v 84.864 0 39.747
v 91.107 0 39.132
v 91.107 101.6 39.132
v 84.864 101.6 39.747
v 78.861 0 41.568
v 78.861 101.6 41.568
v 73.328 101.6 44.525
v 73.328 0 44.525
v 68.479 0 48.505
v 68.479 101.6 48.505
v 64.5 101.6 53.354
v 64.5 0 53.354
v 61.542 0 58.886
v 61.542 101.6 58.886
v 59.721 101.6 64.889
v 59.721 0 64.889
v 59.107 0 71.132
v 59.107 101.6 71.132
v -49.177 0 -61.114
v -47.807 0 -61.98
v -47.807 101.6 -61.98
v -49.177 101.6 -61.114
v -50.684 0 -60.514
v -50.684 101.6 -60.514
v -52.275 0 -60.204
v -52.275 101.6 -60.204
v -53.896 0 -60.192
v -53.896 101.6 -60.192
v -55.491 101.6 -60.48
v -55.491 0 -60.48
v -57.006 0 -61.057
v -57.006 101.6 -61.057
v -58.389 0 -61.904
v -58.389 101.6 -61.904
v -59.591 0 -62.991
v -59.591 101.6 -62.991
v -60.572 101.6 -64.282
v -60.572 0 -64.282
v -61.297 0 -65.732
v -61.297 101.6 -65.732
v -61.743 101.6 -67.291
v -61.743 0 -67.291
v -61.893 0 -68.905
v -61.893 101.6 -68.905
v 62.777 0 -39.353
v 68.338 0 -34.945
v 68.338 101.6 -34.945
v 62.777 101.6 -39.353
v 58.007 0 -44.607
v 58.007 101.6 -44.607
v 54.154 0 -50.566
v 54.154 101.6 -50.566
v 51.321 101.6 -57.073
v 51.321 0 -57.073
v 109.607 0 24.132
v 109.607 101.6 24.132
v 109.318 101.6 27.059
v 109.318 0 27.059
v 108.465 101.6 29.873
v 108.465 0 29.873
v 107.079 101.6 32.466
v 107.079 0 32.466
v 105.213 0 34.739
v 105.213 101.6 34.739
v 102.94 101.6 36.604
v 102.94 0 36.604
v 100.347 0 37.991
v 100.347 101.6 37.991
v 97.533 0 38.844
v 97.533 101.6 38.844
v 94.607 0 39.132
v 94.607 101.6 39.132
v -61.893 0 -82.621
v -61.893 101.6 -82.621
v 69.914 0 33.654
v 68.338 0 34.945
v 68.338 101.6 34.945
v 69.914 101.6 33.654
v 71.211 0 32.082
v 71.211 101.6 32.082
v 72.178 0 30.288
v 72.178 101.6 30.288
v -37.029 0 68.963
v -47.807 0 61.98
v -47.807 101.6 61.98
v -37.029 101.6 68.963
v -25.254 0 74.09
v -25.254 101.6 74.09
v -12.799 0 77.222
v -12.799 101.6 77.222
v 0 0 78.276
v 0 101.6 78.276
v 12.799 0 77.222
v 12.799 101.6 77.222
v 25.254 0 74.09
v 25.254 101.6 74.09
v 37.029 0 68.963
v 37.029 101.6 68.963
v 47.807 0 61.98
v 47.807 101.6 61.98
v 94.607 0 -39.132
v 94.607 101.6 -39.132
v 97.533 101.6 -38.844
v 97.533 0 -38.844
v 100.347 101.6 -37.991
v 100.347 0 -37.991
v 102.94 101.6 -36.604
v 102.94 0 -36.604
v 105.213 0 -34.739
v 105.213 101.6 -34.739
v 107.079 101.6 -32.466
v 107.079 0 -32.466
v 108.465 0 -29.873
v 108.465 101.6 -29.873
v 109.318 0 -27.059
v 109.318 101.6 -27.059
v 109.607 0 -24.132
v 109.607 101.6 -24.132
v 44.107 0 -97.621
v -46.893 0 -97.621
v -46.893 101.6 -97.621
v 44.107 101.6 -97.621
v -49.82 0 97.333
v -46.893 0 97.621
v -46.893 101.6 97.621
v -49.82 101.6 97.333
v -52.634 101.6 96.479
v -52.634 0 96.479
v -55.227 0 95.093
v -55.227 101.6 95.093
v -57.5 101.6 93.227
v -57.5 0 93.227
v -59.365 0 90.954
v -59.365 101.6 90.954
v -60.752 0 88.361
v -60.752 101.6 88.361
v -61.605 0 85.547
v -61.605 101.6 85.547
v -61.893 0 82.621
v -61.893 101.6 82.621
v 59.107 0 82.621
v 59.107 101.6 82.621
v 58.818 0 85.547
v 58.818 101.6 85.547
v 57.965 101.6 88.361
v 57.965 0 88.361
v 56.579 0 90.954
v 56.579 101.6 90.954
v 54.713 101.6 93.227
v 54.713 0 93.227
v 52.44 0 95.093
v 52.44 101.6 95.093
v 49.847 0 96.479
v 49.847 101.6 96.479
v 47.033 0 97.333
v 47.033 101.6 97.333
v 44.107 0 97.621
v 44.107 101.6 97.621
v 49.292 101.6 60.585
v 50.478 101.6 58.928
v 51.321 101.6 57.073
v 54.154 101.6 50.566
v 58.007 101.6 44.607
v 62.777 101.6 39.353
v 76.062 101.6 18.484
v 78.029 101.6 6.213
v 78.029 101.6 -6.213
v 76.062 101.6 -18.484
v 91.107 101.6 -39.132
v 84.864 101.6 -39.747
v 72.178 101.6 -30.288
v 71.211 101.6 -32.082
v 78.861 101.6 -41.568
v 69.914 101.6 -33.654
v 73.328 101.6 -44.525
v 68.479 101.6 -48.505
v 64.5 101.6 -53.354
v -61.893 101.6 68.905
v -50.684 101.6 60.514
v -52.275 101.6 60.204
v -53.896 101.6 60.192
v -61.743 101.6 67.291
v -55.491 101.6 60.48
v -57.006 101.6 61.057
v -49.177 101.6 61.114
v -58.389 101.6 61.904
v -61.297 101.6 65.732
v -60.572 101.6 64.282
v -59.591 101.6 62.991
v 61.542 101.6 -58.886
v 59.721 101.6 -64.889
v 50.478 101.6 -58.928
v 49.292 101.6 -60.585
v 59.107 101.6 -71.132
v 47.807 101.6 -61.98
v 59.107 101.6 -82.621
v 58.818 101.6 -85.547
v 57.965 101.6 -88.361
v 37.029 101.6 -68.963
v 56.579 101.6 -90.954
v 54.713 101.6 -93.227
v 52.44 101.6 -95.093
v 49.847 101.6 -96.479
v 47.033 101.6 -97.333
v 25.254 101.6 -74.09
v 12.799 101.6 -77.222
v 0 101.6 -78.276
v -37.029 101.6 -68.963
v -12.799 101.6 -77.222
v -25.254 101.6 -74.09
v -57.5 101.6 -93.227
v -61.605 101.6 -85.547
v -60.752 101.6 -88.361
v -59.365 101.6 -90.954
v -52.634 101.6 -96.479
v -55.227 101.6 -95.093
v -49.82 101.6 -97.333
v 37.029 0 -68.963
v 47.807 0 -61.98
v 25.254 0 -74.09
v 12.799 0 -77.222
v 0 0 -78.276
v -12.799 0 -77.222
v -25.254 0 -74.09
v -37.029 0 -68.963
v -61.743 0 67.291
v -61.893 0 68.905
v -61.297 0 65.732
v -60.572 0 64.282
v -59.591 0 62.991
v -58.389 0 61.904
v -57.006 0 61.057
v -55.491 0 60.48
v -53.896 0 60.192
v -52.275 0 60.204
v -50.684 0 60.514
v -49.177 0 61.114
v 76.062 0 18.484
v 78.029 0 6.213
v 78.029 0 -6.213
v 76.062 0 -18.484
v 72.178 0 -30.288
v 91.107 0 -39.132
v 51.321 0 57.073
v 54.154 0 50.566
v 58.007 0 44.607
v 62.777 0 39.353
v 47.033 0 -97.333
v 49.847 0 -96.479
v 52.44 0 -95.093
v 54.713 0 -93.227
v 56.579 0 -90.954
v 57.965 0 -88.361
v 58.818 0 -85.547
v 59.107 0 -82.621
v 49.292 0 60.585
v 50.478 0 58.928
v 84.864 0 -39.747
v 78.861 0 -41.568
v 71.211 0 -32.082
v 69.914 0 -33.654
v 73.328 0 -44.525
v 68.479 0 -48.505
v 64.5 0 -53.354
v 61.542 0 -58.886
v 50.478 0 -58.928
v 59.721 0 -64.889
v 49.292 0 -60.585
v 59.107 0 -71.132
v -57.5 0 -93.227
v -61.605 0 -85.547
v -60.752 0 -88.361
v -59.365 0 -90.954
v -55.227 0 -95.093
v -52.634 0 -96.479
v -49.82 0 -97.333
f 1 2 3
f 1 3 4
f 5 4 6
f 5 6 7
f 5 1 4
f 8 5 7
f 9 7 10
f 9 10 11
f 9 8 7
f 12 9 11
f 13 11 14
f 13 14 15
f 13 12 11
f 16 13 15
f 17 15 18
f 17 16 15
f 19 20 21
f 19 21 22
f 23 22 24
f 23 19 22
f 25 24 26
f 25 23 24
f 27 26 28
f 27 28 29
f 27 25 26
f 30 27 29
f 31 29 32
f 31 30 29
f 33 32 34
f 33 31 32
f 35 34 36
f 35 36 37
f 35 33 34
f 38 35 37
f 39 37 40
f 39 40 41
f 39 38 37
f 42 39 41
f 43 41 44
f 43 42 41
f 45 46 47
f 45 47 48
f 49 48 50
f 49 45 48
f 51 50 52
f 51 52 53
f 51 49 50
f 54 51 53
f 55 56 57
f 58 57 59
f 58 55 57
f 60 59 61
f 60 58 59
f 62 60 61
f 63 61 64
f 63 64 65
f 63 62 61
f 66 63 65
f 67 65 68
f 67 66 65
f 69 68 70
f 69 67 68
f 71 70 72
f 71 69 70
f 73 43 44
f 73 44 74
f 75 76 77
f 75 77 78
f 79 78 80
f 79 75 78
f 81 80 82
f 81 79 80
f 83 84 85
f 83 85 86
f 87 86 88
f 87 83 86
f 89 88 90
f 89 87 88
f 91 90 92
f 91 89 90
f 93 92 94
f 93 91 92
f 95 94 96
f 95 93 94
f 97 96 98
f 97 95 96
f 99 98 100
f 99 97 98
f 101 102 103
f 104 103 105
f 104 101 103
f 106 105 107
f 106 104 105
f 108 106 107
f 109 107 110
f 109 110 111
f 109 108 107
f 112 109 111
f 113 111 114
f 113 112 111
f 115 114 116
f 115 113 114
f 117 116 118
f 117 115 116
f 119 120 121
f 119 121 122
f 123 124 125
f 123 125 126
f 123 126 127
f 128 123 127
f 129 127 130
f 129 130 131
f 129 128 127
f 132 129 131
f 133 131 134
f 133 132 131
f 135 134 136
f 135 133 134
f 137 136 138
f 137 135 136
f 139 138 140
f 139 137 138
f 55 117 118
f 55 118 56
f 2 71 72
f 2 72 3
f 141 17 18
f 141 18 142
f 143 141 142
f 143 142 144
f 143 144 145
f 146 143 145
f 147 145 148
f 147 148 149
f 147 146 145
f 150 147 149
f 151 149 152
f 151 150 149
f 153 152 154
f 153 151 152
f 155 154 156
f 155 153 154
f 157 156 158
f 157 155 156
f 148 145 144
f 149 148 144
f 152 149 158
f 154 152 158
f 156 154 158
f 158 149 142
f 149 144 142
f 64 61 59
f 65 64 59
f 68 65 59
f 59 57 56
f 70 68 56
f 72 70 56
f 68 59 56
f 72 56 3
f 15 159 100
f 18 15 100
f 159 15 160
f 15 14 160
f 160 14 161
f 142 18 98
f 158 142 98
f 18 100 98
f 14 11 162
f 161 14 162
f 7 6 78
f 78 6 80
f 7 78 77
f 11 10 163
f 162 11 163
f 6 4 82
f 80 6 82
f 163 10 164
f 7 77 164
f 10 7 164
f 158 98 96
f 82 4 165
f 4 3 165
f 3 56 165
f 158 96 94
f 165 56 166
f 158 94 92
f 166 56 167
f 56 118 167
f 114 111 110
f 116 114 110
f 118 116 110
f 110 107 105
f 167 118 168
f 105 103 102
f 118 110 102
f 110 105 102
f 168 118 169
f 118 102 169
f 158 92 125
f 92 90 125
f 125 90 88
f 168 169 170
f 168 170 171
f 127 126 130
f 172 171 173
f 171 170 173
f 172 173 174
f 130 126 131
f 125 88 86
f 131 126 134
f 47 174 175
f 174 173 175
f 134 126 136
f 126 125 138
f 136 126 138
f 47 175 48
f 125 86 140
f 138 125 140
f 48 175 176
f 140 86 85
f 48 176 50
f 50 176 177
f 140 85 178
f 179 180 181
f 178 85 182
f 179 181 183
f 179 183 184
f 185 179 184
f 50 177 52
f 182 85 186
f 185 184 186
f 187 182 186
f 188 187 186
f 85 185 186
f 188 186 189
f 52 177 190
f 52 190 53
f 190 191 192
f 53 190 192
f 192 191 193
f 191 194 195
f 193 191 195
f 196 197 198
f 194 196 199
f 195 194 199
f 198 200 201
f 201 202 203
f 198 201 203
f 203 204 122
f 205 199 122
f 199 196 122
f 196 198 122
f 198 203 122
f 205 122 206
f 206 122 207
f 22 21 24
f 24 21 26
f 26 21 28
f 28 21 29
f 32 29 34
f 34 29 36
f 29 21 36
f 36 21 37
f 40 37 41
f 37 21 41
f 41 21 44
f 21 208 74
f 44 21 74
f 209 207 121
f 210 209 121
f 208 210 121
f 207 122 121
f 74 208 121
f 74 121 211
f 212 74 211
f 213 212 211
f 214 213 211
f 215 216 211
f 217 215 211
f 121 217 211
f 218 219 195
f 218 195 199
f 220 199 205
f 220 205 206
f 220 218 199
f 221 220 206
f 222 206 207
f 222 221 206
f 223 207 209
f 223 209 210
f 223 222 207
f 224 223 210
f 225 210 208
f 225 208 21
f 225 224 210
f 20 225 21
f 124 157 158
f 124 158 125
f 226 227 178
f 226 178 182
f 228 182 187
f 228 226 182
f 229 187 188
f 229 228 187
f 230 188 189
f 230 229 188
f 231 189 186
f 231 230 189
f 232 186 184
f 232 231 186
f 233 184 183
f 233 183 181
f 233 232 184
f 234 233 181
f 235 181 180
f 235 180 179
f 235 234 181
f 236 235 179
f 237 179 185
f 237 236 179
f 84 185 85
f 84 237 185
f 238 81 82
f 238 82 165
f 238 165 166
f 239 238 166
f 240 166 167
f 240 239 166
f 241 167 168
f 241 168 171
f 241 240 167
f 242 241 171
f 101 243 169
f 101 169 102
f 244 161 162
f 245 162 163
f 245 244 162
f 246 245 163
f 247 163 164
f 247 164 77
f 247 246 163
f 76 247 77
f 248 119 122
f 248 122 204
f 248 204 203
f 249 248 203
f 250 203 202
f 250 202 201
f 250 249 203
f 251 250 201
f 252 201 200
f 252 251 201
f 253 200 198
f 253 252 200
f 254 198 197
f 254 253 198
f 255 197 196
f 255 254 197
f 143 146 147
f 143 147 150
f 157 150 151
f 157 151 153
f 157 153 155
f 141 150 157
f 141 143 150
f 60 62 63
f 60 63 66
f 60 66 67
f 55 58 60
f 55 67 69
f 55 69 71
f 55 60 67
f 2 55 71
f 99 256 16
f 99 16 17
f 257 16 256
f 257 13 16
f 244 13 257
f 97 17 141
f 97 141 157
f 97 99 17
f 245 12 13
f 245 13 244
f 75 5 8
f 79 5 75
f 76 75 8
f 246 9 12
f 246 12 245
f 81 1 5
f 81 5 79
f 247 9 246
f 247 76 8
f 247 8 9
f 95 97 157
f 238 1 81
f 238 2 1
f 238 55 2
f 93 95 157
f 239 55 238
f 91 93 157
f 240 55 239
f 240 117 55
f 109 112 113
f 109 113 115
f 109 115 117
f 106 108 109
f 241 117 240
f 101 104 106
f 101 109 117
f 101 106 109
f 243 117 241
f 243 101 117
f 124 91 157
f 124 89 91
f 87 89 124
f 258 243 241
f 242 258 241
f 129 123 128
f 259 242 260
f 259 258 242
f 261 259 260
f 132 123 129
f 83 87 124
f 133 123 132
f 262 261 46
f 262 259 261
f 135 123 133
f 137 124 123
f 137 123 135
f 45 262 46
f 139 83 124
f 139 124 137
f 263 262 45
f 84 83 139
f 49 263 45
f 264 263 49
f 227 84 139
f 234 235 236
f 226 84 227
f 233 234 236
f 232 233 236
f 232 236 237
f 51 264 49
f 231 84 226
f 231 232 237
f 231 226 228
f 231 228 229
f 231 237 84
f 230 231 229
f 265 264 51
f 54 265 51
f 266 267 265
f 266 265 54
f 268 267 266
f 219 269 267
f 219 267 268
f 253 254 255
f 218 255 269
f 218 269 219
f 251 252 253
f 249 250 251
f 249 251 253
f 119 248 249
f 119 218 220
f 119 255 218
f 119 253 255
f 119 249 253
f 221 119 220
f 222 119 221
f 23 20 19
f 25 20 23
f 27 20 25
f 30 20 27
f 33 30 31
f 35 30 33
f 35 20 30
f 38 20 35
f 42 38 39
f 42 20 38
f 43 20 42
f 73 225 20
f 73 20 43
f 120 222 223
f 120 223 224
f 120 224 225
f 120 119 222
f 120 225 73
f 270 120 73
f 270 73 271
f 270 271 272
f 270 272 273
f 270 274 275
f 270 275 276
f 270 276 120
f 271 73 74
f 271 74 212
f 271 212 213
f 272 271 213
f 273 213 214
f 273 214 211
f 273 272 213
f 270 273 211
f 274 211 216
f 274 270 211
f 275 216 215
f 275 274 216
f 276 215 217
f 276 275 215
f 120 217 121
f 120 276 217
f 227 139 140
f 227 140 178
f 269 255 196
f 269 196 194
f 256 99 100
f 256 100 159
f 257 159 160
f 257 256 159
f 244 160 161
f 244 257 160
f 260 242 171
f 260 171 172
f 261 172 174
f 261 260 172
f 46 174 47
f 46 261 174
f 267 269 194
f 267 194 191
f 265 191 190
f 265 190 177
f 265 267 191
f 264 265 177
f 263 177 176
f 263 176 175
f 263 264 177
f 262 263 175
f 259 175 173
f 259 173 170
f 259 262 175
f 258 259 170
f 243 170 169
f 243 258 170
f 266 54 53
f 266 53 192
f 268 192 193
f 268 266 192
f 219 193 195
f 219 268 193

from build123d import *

# Parameters (mm, degrees)
BOSS_EXTRUDE1_DEPTH = 101.6


with BuildPart() as part:
    # Sketch1 → Boss-Extrude1 (new body)
    with BuildSketch(Plane(origin=(0, 0, 0), x_dir=(1, 0, 0), z_dir=(0, 1, 0))):
        with BuildLine():
            Line((-61.89337695, 68.904893678), (-61.89337695, 82.620893678))
            ThreePointArc((-61.89337695, 82.620893678), (-57.499978668, 93.227495396), (-46.89337695, 97.620893678))
            Line((-46.89337695, 97.620893678), (44.10662305, 97.620893678))
            ThreePointArc((44.10662305, 97.620893678), (54.713224768, 93.227495396), (59.10662305, 82.620893678))
            Line((59.10662305, 82.620893678), (59.10662305, 71.13235))
            ThreePointArc((59.10662305, 71.13235), (68.479206052, 48.504933002), (91.10662305, 39.13235))
            Line((91.10662305, 39.13235), (94.60662305, 39.13235))
            ThreePointArc((94.60662305, 39.13235), (105.213224768, 34.738951718), (109.60662305, 24.13235))
            Line((109.60662305, 24.13235), (109.60662305, -24.13235))
            ThreePointArc((109.60662305, -24.13235), (105.213224768, -34.738951718), (94.60662305, -39.13235))
            Line((94.60662305, -39.13235), (91.10662305, -39.13235))
            ThreePointArc((91.10662305, -39.13235), (68.479206052, -48.504933002), (59.10662305, -71.13235))
            Line((59.10662305, -71.13235), (59.10662305, -82.620893678))
            ThreePointArc((59.10662305, -82.620893678), (54.713224768, -93.227495396), (44.10662305, -97.620893678))
            Line((44.10662305, -97.620893678), (-46.89337695, -97.620893678))
            ThreePointArc((-46.89337695, -97.620893678), (-57.499978668, -93.227495396), (-61.89337695, -82.620893678))
            Line((-61.89337695, -82.620893678), (-61.89337695, -68.904893678))
            ThreePointArc((-61.89337695, -68.904893678), (-57.006333295, -61.056893678), (-47.807345705, -61.98043415))
            ThreePointArc((-47.807345705, -61.98043415), (1.776e-06, -78.2759), (47.807348518, -61.98043198))
            ThreePointArc((47.807348518, -61.98043198), (49.925699103, -59.785267241), (51.321425315, -57.072684381))
            ThreePointArc((51.321425315, -57.072684381), (58.006985995, -44.607187443), (68.337697819, -34.944800122))
            ThreePointArc((68.337697819, -34.944800122), (70.600912289, -32.899312969), (72.178496552, -30.288300651))
            ThreePointArc((72.178496552, -30.288300651), (78.2759, -7.06e-07), (72.178497098, 30.288299349))
            ThreePointArc((72.178497098, 30.288299349), (70.600912642, 32.899311988), (68.337697819, 34.94479931))
            ThreePointArc((68.337697819, 34.94479931), (58.006984392, 44.607187472), (51.321422969, 57.072685993))
            ThreePointArc((51.321422969, 57.072685993), (49.92569661, 59.785269199), (47.807345705, 61.98043415))
            ThreePointArc((47.807345705, 61.98043415), (0, 78.2759), (-47.807345705, 61.98043415))
            ThreePointArc((-47.807345705, 61.98043415), (-57.006333295, 61.056893678), (-61.89337695, 68.904893678))
        make_face()
    extrude(amount=BOSS_EXTRUDE1_DEPTH)


solid = part.part
